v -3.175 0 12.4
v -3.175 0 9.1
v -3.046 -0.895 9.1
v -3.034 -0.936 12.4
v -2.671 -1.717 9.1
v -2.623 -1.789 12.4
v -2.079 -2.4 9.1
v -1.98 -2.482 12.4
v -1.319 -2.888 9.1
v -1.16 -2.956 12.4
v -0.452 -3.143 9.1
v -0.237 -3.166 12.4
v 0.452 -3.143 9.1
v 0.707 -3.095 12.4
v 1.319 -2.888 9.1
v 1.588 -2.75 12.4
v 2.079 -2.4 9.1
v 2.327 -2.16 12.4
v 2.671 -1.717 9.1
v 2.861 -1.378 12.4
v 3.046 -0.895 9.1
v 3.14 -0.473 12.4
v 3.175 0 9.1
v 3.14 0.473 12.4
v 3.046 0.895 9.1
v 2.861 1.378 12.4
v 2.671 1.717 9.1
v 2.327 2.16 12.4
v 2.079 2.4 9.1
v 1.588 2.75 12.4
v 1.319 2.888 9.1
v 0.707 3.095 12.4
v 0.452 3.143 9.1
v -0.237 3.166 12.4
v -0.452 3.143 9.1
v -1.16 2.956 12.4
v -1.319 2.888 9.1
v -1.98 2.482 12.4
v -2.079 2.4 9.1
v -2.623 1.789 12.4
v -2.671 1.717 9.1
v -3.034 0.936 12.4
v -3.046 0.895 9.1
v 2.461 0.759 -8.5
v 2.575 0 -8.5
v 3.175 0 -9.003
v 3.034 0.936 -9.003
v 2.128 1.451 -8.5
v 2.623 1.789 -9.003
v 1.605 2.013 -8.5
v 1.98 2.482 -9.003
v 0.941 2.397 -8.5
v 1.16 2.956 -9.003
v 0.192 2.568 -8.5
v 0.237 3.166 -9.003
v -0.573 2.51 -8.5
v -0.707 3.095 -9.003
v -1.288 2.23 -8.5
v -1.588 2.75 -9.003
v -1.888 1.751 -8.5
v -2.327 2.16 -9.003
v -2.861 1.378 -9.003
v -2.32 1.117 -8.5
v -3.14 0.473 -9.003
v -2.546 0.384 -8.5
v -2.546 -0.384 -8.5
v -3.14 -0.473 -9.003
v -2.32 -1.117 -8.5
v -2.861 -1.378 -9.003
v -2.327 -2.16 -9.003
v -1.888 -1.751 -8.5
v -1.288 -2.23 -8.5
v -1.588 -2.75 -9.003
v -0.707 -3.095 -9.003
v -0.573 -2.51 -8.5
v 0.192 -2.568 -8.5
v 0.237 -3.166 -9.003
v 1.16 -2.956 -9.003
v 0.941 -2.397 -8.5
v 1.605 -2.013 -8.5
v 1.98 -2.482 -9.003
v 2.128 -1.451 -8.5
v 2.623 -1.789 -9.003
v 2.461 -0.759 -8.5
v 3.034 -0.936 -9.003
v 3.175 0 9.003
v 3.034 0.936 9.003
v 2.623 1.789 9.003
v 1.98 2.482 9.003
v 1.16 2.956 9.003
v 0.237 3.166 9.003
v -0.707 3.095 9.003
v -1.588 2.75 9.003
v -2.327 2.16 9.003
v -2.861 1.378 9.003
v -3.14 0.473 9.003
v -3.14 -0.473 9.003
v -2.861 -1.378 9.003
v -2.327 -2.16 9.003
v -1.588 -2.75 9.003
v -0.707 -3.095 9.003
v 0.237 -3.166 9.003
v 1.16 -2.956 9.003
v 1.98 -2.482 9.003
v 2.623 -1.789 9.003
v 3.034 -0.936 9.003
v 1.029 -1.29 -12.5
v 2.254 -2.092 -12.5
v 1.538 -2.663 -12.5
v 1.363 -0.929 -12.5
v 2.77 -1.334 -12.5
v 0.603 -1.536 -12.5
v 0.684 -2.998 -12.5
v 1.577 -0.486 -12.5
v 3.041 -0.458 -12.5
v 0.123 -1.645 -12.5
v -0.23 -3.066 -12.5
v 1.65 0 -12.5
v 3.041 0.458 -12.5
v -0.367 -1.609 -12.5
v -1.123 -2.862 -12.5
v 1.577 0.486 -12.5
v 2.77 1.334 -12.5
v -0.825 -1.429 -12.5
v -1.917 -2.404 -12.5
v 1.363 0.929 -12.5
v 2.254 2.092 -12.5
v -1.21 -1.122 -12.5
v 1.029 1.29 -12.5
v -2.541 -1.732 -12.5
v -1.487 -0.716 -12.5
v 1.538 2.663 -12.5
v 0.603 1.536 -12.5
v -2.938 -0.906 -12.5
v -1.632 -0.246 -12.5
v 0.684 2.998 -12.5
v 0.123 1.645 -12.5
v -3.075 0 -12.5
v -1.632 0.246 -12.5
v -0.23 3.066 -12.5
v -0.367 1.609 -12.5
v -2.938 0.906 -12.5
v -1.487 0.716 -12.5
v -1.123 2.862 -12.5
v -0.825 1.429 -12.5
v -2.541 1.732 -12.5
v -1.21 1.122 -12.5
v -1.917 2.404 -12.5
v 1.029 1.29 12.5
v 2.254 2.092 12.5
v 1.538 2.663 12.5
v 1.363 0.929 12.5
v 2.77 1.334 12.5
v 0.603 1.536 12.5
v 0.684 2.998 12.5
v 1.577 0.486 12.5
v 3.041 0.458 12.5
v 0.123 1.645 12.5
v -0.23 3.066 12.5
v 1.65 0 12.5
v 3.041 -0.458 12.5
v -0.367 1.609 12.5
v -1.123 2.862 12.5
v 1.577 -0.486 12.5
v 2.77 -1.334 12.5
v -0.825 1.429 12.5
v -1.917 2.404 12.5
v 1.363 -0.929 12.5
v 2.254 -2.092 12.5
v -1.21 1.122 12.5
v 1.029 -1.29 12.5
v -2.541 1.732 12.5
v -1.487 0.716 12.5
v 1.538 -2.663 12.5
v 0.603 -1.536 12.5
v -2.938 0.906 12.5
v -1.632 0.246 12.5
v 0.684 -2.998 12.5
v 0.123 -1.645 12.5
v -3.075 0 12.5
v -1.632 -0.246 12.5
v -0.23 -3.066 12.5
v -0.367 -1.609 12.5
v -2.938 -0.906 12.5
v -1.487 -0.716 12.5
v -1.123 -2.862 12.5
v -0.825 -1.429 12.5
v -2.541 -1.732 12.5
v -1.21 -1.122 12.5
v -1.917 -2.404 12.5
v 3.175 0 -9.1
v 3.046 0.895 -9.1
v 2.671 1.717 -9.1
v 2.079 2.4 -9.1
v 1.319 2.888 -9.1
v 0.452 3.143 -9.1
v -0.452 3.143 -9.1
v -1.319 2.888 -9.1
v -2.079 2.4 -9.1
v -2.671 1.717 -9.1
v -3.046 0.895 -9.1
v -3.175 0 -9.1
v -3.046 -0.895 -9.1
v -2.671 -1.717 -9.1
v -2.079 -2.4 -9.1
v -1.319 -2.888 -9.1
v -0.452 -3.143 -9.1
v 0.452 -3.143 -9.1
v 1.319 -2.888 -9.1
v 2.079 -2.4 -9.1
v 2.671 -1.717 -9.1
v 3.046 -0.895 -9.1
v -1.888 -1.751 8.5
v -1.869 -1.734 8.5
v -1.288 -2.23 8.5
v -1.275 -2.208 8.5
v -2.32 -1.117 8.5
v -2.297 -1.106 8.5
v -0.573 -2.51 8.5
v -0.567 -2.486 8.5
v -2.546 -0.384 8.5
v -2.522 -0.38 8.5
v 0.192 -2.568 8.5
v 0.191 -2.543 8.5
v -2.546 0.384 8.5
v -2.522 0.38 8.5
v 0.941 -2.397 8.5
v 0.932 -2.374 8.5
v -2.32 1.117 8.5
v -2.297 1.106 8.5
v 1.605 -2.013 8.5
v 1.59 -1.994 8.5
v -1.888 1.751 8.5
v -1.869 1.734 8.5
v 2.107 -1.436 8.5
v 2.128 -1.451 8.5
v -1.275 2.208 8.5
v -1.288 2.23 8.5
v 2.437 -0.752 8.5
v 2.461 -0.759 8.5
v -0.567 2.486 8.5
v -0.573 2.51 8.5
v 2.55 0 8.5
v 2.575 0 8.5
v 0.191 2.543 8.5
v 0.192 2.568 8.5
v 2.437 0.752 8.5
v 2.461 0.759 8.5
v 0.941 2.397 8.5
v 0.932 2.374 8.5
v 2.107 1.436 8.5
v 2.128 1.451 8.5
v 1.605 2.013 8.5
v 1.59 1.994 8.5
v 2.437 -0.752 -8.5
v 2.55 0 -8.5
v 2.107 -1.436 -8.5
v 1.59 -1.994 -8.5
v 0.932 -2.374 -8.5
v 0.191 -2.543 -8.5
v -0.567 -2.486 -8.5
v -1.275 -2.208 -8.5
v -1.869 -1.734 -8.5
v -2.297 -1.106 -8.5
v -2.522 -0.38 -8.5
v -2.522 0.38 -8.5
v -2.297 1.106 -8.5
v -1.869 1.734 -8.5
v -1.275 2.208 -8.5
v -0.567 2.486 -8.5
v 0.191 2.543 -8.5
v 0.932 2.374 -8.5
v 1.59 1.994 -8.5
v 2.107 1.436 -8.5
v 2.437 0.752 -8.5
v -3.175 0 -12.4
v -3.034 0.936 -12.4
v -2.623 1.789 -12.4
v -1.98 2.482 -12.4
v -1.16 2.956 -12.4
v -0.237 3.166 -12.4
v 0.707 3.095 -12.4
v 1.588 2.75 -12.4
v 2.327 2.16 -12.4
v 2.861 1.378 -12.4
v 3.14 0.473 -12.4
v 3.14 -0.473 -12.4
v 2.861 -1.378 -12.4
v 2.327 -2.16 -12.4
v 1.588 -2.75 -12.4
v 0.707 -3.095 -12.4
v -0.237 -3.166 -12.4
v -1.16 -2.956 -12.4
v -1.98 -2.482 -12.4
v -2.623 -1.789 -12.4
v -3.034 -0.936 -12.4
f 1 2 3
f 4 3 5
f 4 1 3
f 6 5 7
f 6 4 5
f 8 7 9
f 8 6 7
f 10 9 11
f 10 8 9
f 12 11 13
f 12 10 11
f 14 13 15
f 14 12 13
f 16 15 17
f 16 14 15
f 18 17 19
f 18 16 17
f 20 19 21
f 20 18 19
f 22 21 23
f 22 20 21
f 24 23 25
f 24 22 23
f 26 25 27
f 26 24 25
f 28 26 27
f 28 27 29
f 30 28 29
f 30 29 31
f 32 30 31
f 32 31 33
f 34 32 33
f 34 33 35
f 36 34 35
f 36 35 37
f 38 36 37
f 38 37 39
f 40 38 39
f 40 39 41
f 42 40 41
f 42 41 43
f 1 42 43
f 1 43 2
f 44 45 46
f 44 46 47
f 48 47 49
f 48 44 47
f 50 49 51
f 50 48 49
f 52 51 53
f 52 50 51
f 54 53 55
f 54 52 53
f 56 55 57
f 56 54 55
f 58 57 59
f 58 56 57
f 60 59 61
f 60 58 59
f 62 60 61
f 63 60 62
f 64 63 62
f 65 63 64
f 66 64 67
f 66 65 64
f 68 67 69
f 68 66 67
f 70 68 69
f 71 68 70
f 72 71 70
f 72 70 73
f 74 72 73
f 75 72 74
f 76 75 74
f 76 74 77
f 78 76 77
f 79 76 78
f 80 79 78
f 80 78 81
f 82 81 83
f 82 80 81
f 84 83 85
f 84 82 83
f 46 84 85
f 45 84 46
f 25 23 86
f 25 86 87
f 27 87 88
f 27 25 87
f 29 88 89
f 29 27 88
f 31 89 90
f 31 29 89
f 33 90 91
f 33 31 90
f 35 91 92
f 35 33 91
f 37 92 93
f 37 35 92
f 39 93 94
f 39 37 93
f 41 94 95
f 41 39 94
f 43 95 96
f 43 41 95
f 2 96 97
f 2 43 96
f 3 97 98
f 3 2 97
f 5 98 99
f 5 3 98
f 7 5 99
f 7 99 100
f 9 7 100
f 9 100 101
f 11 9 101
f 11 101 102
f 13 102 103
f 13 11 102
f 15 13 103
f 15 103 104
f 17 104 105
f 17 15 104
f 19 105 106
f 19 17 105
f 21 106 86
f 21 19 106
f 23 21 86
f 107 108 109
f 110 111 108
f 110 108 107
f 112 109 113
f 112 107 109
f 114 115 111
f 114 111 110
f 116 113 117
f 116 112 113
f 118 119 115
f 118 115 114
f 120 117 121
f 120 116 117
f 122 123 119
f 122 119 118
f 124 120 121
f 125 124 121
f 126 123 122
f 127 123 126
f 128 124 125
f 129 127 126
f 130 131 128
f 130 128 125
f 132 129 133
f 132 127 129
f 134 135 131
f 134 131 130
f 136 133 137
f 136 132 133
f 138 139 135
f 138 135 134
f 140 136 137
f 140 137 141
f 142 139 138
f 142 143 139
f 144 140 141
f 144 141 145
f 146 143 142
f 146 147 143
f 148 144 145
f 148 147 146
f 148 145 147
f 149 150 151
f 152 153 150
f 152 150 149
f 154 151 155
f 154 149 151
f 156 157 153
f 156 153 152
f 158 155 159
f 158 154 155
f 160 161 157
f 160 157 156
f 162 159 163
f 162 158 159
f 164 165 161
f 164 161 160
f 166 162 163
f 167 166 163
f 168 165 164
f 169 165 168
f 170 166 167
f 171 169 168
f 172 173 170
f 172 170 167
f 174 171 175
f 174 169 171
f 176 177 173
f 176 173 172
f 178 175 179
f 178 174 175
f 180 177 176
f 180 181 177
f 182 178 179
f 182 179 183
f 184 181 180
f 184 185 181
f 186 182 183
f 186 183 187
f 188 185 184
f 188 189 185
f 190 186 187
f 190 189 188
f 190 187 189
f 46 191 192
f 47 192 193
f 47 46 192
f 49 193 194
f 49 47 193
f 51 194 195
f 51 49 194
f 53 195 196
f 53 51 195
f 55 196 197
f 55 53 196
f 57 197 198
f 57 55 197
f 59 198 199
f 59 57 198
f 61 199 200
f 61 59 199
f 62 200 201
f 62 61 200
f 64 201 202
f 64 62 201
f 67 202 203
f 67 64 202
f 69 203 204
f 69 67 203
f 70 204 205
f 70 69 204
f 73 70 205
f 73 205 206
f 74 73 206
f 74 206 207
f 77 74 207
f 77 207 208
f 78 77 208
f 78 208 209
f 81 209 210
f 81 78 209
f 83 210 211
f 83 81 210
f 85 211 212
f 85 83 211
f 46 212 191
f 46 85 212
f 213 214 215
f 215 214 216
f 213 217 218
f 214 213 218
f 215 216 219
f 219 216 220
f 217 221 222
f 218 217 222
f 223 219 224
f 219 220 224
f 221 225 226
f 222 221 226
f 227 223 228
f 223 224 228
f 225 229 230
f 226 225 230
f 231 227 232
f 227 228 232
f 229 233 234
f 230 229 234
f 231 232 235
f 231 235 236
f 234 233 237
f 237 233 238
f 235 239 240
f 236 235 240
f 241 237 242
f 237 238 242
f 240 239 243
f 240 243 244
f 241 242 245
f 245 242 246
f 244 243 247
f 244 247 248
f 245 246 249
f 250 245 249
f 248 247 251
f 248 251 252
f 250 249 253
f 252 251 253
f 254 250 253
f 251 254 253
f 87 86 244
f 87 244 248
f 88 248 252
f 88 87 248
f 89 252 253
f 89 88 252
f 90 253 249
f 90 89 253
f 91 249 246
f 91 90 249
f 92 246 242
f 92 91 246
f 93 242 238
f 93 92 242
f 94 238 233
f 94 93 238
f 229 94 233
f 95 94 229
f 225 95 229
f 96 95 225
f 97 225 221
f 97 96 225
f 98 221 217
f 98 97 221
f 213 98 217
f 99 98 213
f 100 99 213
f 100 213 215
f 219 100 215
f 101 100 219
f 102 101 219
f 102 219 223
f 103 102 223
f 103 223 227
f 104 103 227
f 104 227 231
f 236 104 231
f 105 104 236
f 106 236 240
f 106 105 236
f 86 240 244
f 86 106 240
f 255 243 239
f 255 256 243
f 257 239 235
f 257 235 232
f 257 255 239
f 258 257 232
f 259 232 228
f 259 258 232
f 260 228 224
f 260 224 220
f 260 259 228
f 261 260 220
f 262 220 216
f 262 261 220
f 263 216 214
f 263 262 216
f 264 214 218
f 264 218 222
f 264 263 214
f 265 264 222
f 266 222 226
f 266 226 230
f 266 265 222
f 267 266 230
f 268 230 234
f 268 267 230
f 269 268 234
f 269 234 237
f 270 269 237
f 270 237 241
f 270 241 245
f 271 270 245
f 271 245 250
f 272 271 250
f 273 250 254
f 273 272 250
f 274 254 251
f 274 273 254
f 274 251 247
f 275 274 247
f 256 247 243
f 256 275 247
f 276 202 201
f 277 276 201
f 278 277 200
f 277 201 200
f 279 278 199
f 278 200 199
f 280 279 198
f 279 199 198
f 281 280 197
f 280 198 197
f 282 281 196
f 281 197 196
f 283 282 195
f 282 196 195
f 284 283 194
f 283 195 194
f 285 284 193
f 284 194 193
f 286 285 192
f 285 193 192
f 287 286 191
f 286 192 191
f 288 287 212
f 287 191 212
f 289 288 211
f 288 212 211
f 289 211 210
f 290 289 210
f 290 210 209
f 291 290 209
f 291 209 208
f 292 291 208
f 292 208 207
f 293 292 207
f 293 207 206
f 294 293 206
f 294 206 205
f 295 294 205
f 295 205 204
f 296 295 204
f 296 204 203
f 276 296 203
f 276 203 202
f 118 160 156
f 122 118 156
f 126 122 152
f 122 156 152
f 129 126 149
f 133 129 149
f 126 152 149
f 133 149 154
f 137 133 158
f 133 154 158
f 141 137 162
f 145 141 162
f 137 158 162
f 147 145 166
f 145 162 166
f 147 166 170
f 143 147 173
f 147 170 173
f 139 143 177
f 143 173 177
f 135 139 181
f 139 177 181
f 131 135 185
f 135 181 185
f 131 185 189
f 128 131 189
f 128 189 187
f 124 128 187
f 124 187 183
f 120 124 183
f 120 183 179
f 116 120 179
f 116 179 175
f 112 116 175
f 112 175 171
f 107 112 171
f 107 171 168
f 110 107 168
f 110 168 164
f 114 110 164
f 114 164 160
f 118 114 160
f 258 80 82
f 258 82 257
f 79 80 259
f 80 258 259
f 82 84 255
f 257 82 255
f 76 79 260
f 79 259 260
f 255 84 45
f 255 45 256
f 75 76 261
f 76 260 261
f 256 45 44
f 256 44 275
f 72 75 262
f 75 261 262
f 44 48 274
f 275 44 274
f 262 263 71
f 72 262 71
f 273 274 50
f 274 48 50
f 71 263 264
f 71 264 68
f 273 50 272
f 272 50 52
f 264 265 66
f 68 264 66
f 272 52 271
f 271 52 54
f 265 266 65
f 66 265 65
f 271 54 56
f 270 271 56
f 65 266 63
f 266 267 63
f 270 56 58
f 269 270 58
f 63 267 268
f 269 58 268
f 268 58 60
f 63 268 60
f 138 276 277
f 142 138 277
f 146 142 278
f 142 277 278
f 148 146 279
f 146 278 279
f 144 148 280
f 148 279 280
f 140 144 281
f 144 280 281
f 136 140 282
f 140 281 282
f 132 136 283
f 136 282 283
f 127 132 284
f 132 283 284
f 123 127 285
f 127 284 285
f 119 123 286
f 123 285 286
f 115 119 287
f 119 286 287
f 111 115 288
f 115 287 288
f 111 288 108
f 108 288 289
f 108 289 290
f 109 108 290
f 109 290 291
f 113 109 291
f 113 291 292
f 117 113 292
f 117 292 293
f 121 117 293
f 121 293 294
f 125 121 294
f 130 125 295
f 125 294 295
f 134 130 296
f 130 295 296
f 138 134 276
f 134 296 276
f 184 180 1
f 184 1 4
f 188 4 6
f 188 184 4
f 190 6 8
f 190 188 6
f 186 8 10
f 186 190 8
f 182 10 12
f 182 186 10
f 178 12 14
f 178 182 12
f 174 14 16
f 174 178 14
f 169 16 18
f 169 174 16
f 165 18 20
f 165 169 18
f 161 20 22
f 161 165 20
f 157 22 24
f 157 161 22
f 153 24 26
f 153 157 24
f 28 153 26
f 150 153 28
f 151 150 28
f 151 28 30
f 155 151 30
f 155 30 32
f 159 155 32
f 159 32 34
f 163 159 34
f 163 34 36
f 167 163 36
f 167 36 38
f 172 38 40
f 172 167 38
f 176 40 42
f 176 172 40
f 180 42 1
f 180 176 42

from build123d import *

# Parameters (mm, degrees)
IZIM1_W                     = 17
IZIM1_H                     = 2.55
IZIM4_R                     = 2.575
Y_KSEKLIK_EKSTR_ZYON1_DEPTH = 0.6
IZIM5_R                     = 3.175
Y_KSEKLIK_EKSTR_ZYON2_DEPTH = 3.4
IZIM7_R                     = 2.575
Y_KSEKLIK_EKSTR_ZYON4_DEPTH = 0.6
Y_KSEKLIK_EKSTR_ZYON5_START = 3.4
IZIM8_R                     = 3.175
Y_KSEKLIK_EKSTR_ZYON5_DEPTH = 3.4
IZIM9_R                     = 1.65
KES_EKSTR_ZYON1_DEPTH       = 100
PAH1_SIZE                   = 0.1


# Read off the part's stored shape, not the designer's step: Draft2, Draft3
with BuildPart() as part:
    # Çizim1 → Döndür3 (revolve)
    with BuildSketch(Plane(origin=(0, 0, 0), x_dir=(0, 0, -1), z_dir=(1, 0, 0)), mode=Mode.PRIVATE) as d_nd_r3_sk:
        with Locations((0, -1.275)):
            Rectangle(IZIM1_W, IZIM1_H)
    revolve(d_nd_r3_sk.sketch.rotate(Axis((0, 0, 15.544933078), (0, 0, -1)), 270), axis=Axis((0, 0, 15.544933078), (0, 0, -1)))

    # Çizim4 → Yükseklik-Ekstrüzyon1 (add)
    with BuildSketch(Plane(origin=(0, 0, -8.5), x_dir=(-1, 0, 0), z_dir=(0, 0, -1))):
        Circle(IZIM4_R)
    extrude(amount=Y_KSEKLIK_EKSTR_ZYON1_DEPTH)

    # Çizim5 → Yükseklik-Ekstrüzyon2 (add)
    with BuildSketch(Plane(origin=(0, 0, -9.1), x_dir=(-1, 0, 0), z_dir=(0, 0, -1))):
        Circle(IZIM5_R)
    extrude(amount=Y_KSEKLIK_EKSTR_ZYON2_DEPTH)

    # Draft2 outline → Draft2 (revolve)
    with BuildSketch(Plane.XZ):
        Polygon((3.175, -9.003459779), (2.575, -8.5), (2.575, -9.1), (3.175, -9.1), align=None)
    revolve(axis=Axis((0, 0, 0), (0, 0, 1)))

    # Çizim7 → Yükseklik-Ekstrüzyon4 (add)
    with BuildSketch(Plane.XY.offset(8.5)):
        Circle(IZIM7_R)
    extrude(amount=Y_KSEKLIK_EKSTR_ZYON4_DEPTH)

    # Çizim8 → Yükseklik-Ekstrüzyon5 (add)
    with BuildSketch(Plane.XY.offset(9.1).offset(Y_KSEKLIK_EKSTR_ZYON5_START)):
        with Locations(Location((0, 0, 0), (0, 0, 180))):
            Circle(IZIM8_R)
    extrude(amount=-Y_KSEKLIK_EKSTR_ZYON5_DEPTH)

    # Draft3 outline → Draft3 (revolve)
    with BuildSketch(Plane.XZ):
        Polygon((2.575, 8.5), (3.175, 9.003459779), (3.175, 9.1), (2.575, 9.1), align=None)
    revolve(axis=Axis((0, 0, 0), (0, 0, 1)))

    # Çizim9 → Kes-Ekstrüzyon1 (cut)
    with BuildSketch(Plane.XY.offset(12.5)):
        Circle(IZIM9_R)
    extrude(amount=-KES_EKSTR_ZYON1_DEPTH, mode=Mode.SUBTRACT)

    # Pah1
    pah1_edges = [part.edges().sort_by_distance(p)[0] for p in [
        (3.175, 0, -12.5),
        (3.175, 0, 12.5),
    ]]
    chamfer(pah1_edges, length=PAH1_SIZE)


solid = part.part
